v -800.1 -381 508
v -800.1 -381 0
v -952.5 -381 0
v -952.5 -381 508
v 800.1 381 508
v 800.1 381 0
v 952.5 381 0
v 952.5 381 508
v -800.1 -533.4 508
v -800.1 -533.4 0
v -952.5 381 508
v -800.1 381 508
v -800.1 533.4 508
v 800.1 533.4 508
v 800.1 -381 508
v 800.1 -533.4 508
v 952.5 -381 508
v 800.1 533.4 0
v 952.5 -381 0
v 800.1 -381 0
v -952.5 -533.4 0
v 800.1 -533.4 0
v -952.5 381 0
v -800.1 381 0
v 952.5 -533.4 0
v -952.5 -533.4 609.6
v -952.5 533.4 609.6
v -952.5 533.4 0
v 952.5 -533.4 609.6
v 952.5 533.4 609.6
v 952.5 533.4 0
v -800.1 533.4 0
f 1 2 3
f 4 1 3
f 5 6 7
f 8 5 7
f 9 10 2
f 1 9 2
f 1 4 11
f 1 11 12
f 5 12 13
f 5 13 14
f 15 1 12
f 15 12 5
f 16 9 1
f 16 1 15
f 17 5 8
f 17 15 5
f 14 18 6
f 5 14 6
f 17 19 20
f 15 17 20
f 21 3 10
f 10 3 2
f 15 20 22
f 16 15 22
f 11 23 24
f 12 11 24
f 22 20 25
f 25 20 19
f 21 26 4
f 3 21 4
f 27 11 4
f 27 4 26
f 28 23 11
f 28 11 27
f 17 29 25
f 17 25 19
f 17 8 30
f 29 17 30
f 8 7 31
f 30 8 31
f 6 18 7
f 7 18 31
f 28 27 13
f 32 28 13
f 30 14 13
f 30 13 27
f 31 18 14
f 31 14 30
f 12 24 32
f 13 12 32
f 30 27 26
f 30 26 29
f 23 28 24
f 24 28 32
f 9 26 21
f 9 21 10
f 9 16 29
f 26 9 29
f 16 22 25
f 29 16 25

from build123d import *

# Parameters (mm, degrees)
F0_W     = 1905
F0_H     = 1066.8
F1_DEPTH = 609.6
F3_DEPTH = 508


with BuildPart() as f1:
    # F0 (on Top) → F1 (new body)
    with BuildSketch(Plane.XY):
        Rectangle(F0_W, F0_H)
    extrude(amount=F1_DEPTH)

    # F2 (on face) → F3 (cut)
    with BuildSketch(Plane(origin=(0, 0, 0), x_dir=(1, 0, 0), z_dir=(0, 0, -1))):
        Polygon((952.5, -381), (952.5, 381), (800.1, 381), (800.1, 533.4), (-800.1, 533.4), (-800.1, 381), (-952.5, 381), (-952.5, -381), (-800.1, -381), (-800.1, -533.4), (800.1, -533.4), (800.1, -381), align=None)
    extrude(amount=-F3_DEPTH, mode=Mode.SUBTRACT)


solid = f1.part
